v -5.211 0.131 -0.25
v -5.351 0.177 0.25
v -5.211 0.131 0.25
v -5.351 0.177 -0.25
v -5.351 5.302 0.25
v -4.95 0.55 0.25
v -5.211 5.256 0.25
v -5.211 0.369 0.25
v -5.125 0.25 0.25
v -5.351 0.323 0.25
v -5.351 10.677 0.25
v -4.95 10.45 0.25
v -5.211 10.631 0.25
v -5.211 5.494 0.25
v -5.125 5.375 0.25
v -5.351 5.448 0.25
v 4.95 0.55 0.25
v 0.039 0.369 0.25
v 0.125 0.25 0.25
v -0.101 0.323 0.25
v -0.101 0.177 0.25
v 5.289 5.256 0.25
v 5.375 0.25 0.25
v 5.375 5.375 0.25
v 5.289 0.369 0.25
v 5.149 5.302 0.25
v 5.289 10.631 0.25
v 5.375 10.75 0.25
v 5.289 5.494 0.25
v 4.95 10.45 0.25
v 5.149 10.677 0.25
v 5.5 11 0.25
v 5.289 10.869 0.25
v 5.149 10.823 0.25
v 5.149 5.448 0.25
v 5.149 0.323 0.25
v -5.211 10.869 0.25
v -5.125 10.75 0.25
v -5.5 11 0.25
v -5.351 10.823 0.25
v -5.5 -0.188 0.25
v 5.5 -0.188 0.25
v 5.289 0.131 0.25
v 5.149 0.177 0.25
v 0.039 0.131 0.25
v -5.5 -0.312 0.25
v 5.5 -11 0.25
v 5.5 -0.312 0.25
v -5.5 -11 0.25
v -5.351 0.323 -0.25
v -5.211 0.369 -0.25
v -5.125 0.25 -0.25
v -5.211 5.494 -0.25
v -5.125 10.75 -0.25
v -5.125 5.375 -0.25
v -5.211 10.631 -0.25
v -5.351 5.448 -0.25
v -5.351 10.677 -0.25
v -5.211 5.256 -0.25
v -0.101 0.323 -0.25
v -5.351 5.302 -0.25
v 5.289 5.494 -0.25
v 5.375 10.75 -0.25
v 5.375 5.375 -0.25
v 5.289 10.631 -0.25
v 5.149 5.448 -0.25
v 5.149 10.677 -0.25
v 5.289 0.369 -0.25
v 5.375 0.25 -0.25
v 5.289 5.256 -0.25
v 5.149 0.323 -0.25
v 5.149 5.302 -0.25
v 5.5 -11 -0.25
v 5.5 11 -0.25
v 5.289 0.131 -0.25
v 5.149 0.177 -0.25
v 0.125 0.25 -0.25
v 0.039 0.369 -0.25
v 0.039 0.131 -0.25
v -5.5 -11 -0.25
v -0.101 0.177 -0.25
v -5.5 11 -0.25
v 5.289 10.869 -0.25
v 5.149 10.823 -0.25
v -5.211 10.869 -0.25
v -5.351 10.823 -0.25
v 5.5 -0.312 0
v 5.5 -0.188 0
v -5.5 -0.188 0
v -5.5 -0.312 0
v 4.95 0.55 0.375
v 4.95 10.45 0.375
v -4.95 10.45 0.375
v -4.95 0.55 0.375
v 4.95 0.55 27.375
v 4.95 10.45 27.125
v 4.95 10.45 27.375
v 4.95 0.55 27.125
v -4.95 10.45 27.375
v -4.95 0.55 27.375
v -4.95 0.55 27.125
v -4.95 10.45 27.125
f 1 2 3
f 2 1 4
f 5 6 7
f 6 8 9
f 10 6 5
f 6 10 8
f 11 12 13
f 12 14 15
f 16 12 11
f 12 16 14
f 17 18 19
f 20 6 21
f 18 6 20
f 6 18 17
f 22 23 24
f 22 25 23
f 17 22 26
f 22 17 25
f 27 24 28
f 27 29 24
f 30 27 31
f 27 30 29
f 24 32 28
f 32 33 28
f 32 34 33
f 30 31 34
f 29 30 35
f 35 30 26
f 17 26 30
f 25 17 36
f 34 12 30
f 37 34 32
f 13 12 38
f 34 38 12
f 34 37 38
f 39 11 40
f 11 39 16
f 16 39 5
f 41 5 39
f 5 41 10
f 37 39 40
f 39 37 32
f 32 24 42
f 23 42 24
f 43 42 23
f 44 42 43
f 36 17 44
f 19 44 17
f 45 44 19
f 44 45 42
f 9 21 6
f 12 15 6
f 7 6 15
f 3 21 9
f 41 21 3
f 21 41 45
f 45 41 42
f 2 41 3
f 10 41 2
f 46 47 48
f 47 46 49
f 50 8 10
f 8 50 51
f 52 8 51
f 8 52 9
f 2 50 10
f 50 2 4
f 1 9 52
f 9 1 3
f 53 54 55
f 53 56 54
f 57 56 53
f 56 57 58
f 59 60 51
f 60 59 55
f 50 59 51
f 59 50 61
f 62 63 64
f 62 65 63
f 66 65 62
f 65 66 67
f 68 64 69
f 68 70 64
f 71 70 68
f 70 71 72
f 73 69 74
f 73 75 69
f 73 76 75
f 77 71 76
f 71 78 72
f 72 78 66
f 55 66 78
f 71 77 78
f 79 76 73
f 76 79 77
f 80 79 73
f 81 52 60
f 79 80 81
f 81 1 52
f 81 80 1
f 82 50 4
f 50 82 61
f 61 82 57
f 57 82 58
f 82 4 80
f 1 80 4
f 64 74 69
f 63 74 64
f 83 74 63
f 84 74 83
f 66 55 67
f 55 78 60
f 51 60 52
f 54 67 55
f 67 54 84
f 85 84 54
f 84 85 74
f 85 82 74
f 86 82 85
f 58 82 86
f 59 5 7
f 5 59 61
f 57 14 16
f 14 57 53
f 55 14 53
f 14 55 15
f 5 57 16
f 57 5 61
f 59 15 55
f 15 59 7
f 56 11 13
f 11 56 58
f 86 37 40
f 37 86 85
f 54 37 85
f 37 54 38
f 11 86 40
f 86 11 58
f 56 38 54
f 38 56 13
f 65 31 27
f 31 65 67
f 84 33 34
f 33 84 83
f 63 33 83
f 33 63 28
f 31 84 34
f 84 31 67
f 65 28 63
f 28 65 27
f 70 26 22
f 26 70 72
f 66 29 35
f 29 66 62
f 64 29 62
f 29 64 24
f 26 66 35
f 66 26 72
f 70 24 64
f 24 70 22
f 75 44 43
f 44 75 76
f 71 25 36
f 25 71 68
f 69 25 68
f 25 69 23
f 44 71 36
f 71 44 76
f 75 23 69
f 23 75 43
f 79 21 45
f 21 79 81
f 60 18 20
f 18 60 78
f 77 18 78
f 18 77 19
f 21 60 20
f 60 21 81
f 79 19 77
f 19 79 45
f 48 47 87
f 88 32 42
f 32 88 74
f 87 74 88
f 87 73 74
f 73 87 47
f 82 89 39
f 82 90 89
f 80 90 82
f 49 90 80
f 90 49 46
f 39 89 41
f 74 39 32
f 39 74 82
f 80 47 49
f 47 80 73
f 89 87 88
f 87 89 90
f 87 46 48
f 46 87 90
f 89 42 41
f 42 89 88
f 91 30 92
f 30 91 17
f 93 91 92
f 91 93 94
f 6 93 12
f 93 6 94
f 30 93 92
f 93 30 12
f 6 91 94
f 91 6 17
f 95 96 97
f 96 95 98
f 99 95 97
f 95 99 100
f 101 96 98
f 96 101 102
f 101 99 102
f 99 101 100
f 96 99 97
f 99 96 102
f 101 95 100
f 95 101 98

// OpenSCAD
width = 11;
half_width = width / 2;

thickness = 0.5;
half_thickness = thickness / 2;
quarter_thickness = thickness / 4;

heigth = 27;

module base() {
  module inset() {
    rotate([90, 90, 0]) {
      translate([-half_thickness,
                 0,
                 half_thickness])
{
        cube([thickness, 
              width + thickness, 
              quarter_thickness], 
             center=true);
      }
    }
  }
  
  module holes() {
    module hole() {
      cylinder(h = thickness, 
               r1 = quarter_thickness, 
               r2 = quarter_thickness, 
               center = true);
    }

    translate([(-width / 2) + half_thickness, half_thickness]) hole();
    translate([(-width / 2) + half_thickness, (width - half_thickness) / 2]) hole();
    translate([(-width / 2) + half_thickness, width - half_thickness, 0]) hole();
    
    translate([(width / 2) - half_thickness, width - half_thickness, 0]) hole();
    translate([(width / 2) - half_thickness, (width - half_thickness) / 2, 0]) hole();
    translate([(width / 2) - half_thickness, half_thickness, 0]) hole();
    
    translate([0, half_thickness, 0]) hole();
  }
  
    
  difference() {
    cube([width, width * 2, thickness], center = true);
    inset();
    holes();
  }
}

module cabin() {
  module slab() {
    cube([width * 0.9, width * 0.9, half_thickness], center = true);
  }
  
  module ceiling() {
    translate([0, half_width, half_thickness + heigth])
    slab();
  }

  module floor() {
    translate([0, half_width, half_thickness])
    slab();
  }
  
  color([0.3, 0, 0])
  union() {
    floor();
    ceiling();
  }

}

function cabin_heigth(t) = t < 0.5 ? t * (heigth * 4.5) : (1 - $t) * (heigth * 4.5);

module house() {
  translate([0,
             -half_thickness,
             heigth * 4.5 / 2])
  union() {
    color("gray", 0.5)
    cube([25,
          quarter_thickness,
          heigth * 4.5],
         center=true);
  }
}

module elevator() {
  union() {
    base();
    %house();

    translate([0, 0, cabin_heigth($t)])
    cabin();
  }
}

elevator();
